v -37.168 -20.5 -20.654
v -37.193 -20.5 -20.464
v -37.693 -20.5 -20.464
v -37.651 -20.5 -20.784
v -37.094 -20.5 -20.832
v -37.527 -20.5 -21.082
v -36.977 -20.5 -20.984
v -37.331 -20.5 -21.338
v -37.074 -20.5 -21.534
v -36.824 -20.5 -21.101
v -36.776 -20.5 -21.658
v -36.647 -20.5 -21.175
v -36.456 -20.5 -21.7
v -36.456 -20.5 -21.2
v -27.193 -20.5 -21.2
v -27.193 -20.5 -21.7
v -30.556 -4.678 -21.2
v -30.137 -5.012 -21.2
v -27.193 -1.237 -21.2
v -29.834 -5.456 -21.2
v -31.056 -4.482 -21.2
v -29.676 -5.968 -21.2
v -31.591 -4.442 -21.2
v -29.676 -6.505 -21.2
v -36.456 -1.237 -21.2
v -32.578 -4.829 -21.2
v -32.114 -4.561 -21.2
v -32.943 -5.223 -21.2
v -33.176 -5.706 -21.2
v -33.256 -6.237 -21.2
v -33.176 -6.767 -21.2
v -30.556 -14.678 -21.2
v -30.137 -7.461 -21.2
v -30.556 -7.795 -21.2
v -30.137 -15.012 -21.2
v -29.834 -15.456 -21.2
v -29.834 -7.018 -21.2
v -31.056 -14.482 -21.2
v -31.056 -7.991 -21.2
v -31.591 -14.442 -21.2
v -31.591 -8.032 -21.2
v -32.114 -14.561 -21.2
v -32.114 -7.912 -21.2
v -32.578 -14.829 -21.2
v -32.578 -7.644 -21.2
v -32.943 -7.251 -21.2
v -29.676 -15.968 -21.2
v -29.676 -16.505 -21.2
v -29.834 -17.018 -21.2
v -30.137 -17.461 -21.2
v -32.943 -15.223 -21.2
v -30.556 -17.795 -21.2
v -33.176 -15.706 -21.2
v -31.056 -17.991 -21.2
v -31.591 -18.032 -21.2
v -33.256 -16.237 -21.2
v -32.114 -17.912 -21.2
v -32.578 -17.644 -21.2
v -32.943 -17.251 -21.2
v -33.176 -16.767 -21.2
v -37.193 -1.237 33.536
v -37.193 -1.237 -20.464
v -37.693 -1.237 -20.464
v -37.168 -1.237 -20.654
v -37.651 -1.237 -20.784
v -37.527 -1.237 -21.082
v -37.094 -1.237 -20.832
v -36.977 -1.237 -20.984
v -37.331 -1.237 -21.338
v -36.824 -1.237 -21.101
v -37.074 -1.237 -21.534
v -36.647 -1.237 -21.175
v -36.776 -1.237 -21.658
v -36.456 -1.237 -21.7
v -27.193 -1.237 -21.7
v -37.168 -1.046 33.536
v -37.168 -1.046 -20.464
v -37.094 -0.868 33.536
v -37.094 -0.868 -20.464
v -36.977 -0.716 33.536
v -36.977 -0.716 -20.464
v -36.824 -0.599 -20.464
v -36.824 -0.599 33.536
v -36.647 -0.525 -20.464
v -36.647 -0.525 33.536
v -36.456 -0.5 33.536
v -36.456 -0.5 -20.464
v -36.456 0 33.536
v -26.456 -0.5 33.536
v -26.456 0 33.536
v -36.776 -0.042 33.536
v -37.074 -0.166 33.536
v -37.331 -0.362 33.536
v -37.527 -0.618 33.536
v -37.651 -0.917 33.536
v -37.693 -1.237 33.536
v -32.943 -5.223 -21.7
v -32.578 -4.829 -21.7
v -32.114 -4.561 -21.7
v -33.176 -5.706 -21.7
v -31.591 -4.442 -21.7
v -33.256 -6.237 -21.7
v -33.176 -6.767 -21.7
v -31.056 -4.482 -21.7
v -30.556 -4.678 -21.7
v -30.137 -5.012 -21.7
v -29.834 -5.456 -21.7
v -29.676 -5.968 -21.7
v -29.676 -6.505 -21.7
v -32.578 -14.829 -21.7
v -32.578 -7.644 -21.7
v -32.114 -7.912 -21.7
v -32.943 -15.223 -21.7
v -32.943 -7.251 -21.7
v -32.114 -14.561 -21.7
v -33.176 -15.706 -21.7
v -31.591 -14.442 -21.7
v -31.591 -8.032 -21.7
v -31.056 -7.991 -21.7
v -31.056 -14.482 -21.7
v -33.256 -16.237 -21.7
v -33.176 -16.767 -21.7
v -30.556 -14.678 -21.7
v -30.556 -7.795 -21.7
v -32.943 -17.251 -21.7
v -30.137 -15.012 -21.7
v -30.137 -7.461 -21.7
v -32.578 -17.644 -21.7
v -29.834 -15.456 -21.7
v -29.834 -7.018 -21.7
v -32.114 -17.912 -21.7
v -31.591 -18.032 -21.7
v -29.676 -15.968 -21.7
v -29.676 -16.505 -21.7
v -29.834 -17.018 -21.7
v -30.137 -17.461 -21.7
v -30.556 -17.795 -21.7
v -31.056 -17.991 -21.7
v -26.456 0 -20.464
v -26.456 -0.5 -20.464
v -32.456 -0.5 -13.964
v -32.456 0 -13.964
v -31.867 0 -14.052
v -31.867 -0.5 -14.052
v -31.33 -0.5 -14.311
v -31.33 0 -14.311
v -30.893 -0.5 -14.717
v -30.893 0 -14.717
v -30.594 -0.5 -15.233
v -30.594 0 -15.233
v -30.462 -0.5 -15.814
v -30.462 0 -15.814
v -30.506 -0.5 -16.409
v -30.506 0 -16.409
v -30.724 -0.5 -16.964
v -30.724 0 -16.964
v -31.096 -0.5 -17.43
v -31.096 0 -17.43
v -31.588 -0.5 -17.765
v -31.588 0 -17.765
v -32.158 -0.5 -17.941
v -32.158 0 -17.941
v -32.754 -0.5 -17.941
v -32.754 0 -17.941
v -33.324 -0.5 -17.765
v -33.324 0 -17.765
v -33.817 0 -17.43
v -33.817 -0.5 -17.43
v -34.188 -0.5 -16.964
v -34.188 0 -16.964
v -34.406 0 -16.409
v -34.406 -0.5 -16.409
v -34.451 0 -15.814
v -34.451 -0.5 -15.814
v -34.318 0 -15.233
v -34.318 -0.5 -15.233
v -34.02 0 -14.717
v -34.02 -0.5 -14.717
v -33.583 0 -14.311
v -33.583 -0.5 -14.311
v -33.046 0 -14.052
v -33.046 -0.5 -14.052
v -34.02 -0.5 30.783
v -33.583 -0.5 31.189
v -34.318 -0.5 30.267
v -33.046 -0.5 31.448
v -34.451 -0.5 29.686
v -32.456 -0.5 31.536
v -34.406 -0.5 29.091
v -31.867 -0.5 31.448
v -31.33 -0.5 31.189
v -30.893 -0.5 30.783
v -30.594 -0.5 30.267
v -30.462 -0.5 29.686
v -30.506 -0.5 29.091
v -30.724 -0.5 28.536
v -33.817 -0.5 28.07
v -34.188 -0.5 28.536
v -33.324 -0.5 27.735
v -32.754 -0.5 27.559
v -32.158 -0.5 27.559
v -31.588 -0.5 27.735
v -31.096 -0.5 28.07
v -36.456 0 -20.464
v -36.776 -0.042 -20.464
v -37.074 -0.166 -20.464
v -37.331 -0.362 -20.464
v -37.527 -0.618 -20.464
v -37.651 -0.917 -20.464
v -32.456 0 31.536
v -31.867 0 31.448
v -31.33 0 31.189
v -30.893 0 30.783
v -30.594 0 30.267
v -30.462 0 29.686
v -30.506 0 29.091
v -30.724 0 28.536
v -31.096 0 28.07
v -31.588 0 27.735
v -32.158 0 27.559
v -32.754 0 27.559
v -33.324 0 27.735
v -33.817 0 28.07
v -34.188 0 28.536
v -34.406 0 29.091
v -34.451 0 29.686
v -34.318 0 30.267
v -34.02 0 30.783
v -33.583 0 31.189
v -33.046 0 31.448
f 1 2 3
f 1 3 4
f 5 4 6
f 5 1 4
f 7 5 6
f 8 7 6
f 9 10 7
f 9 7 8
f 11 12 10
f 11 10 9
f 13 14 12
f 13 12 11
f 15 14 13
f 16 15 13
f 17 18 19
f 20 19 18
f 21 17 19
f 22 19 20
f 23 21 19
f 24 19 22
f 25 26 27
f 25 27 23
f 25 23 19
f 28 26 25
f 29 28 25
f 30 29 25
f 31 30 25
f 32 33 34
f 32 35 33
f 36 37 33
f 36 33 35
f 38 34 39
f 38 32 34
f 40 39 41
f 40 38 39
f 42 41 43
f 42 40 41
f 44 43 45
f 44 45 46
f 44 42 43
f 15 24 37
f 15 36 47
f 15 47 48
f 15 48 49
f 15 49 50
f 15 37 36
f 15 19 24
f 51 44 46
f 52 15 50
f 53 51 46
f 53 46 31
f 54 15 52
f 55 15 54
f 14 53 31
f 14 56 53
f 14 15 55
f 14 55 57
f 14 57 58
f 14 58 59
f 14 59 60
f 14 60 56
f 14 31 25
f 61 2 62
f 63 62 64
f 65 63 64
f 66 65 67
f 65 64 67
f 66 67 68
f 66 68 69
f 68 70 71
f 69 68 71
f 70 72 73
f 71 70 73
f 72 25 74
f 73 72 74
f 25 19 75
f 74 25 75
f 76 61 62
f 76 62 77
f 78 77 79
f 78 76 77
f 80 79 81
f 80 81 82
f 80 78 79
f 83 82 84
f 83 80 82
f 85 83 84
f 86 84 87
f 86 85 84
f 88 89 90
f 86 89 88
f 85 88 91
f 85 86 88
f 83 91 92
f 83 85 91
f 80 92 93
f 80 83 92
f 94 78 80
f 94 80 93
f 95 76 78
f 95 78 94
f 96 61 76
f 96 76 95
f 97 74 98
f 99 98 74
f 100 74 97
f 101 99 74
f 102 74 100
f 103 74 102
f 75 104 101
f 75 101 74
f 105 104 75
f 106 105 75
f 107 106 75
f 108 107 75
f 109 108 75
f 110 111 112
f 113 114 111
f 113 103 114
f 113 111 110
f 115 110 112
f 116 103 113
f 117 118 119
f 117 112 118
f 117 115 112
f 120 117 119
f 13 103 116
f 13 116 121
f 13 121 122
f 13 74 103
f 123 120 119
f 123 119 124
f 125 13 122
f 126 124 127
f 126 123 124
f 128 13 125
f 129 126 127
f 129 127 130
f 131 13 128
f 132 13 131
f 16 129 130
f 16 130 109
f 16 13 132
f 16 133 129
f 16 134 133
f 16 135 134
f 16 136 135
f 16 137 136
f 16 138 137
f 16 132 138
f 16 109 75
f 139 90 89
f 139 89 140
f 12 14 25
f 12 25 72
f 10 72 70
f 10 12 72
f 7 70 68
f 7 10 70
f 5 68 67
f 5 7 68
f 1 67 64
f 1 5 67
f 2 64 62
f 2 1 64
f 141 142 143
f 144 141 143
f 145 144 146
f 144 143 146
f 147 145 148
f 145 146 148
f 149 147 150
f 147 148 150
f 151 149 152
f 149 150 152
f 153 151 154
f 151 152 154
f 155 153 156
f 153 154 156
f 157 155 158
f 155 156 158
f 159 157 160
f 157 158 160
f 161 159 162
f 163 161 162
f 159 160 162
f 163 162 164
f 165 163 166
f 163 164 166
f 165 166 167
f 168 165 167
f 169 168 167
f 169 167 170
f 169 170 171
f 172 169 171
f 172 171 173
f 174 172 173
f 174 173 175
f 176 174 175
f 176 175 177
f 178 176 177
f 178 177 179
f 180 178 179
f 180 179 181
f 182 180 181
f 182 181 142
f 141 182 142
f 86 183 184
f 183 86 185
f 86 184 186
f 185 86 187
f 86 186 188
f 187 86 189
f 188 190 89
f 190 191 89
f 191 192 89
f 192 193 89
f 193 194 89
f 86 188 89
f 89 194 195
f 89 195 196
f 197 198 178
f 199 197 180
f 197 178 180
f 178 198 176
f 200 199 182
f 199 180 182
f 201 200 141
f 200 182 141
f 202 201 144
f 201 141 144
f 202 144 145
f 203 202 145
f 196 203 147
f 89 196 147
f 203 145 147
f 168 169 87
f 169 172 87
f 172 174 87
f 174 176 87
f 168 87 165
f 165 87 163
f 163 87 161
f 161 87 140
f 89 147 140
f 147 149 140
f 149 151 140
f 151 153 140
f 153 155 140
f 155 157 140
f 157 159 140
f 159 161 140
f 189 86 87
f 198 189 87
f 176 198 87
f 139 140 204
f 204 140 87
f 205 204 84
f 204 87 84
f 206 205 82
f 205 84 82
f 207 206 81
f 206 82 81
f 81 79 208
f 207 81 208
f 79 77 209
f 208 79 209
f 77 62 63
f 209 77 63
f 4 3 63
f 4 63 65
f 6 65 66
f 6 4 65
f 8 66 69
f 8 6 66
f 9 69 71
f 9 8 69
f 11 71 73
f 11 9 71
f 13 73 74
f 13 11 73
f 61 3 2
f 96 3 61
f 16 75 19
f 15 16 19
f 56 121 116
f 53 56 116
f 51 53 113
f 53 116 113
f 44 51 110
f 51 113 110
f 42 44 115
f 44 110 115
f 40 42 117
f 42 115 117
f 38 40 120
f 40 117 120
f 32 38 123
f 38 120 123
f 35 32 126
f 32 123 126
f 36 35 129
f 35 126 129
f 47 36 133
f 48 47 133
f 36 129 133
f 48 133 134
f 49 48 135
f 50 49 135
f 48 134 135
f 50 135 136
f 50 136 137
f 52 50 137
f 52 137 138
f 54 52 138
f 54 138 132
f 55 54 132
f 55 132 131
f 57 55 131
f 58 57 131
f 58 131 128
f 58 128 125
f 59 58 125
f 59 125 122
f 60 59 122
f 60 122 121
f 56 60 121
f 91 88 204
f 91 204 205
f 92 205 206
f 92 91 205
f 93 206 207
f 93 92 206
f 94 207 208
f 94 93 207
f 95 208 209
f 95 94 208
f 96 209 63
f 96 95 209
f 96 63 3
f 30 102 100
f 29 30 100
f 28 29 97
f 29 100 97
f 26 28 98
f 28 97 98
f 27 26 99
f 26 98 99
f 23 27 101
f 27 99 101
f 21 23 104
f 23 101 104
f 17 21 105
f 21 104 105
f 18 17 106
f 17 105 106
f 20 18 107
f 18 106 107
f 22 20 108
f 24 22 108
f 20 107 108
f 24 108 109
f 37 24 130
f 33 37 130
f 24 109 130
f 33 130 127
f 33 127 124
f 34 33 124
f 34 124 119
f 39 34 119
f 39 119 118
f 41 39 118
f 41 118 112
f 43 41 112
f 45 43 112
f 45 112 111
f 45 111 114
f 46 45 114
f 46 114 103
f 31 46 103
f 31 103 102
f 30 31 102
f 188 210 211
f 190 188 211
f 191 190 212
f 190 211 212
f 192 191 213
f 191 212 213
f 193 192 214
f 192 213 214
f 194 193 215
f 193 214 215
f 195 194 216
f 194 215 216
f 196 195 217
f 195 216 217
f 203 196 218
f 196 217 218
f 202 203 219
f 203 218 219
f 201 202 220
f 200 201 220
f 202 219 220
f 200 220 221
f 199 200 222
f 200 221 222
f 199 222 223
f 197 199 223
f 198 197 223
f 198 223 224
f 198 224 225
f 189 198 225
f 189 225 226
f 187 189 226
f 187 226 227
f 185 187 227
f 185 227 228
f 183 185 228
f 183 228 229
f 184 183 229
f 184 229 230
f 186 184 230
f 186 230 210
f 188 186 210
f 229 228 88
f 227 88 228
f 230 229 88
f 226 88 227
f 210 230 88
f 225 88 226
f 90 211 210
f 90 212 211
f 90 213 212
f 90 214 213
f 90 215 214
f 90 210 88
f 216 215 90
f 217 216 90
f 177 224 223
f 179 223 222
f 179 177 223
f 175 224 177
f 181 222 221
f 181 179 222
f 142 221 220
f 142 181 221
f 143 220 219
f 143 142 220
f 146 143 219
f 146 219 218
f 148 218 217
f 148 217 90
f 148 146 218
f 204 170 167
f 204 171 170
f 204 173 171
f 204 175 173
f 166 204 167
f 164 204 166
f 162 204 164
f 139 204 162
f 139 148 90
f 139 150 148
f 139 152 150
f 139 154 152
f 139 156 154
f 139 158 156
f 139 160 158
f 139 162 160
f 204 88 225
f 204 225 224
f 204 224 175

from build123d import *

# Parameters (mm, degrees)
SKETCH1_W          = 10
SKETCH1_H          = 54
BASE_FLANGE1_DEPTH = 0.5
EDGE_FLANGE1_DEPTH = 54
CUT_EXTRUDE1_DEPTH = 10
EDGE_FLANGE2_DEPTH = 19.2634
SKETCH11_R         = 1.8
CUT_EXTRUDE2_DEPTH = 10
SKETCH12_R         = 2
CUT_EXTRUDE3_DEPTH = 10


# Sheet-metal steps are written as plain solids
with BuildPart() as part:
    # Sketch1 → Base-Flange1 (new body)
    with BuildSketch(Plane(origin=(0, 0, 0), x_dir=(1, 0, 0), z_dir=(0, 1, 0))):
        with Locations((-31.456172324, -6.536484397)):
            Rectangle(SKETCH1_W, SKETCH1_H)
    extrude(amount=-BASE_FLANGE1_DEPTH)

    # Edge-Flange1 section (across the edge) → Edge-Flange1 (add)
    with BuildSketch(Plane(origin=(-37.192772324, -0.5, 33.536484397), x_dir=(1, 0, 0), z_dir=(0, 0, -1))):
        with BuildLine():
            Line((-0.5, 0.7366), (-0.5, 20))
            Line((-0.5, 20), (0, 20))
            Line((0, 20), (0, 0.7366))
            ThreePointArc((0, 0.7366), (0.215745145, 0.215745145), (0.7366, 0))
            Line((0.7366, 0), (0.7366, -0.5))
            ThreePointArc((0.7366, -0.5), (-0.137808246, -0.137808246), (-0.5, 0.7366))
        make_face()
    extrude(amount=EDGE_FLANGE1_DEPTH)

    # Sketch7 → Cut-Extrude1 (cut)
    with BuildSketch(Plane.ZY.offset(37.692772324)):
        Polygon((-20.463515603, -20.5), (33.536484397, -1.2366), (33.536484397, -20.5), align=None)
    extrude(amount=-CUT_EXTRUDE1_DEPTH, mode=Mode.SUBTRACT)

    # Edge-Flange2 section (across the edge) → Edge-Flange2 (add)
    with BuildSketch(Plane(origin=(-37.192772324, -20.5, -21.200115603), x_dir=(0, 0, 1), z_dir=(0, 1, 0))):
        with BuildLine():
            Line((-0.5, 0.7366), (-0.5, 10))
            Line((-0.5, 10), (0, 10))
            Line((0, 10), (0, 0.7366))
            ThreePointArc((0, 0.7366), (0.215745145, 0.215745145), (0.7366, 0))
            Line((0.7366, 0), (0.7366, -0.5))
            ThreePointArc((0.7366, -0.5), (-0.137808246, -0.137808246), (-0.5, 0.7366))
        make_face()
    extrude(amount=EDGE_FLANGE2_DEPTH)

    # Sketch11 → Cut-Extrude2 (cut)
    with BuildSketch(Plane(origin=(0, 0, -21.700115603), x_dir=(-1, 0, 0), z_dir=(0, 0, -1))):
        with Locations((31.456172324, -6.2366)):
            Circle(SKETCH11_R)
        with Locations((31.456172324, -16.2366)):
            Circle(SKETCH11_R)
    extrude(amount=-CUT_EXTRUDE2_DEPTH, mode=Mode.SUBTRACT)

    # Sketch12 → Cut-Extrude3 (cut)
    with BuildSketch(Plane(origin=(0, 0, 0), x_dir=(1, 0, 0), z_dir=(0, 1, 0))):
        with Locations(Location((-32.456172324, -29.536484397, 0), (0, 0, 270))):
            Circle(SKETCH12_R)
        with Locations(Location((-32.456172324, 15.963515603, 0), (0, 0, 270))):
            Circle(SKETCH12_R)
    extrude(amount=-CUT_EXTRUDE3_DEPTH, mode=Mode.SUBTRACT)


solid = part.part
